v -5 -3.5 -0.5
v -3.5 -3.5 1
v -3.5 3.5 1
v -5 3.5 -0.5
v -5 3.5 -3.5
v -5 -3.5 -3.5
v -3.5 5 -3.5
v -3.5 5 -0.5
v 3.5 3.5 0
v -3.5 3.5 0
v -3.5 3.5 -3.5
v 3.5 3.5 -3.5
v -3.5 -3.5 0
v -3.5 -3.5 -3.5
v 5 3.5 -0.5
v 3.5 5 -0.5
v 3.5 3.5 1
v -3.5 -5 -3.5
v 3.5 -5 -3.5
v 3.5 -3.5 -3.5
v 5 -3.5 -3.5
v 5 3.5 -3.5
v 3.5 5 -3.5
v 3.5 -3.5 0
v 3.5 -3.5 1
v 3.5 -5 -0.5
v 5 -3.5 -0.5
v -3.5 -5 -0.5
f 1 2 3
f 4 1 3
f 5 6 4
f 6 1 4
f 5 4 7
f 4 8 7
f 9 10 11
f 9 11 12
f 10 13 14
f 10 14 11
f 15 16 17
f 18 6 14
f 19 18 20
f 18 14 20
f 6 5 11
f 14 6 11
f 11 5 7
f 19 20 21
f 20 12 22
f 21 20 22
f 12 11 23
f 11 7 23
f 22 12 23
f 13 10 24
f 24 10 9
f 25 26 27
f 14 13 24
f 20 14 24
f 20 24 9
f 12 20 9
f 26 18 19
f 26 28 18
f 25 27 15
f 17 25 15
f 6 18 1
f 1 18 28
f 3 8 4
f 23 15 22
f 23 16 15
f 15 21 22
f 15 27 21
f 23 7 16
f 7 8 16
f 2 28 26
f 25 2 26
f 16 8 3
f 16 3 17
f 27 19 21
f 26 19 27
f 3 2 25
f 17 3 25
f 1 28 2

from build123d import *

# Parameters (mm, degrees)
F0_W     = 10
F0_H     = 10
F0_W_2   = 7
F0_H_2   = 7
F1_DEPTH = 1
F2_DEPTH = 3.5
F3_SIZE  = 1.5


with BuildPart() as f1:
    # F0 (on Top) → F1 (new body)
    with BuildSketch(Plane.XY):
        Rectangle(F0_W, F0_H)
        Rectangle(F0_W_2, F0_H_2, mode=Mode.SUBTRACT)
        Rectangle(F0_W_2, F0_H_2)
    extrude(amount=F1_DEPTH)

    # F0 (on Top) → F2 (join)
    with BuildSketch(Plane.XY):
        Rectangle(F0_W, F0_H)
        Rectangle(F0_W_2, F0_H_2, mode=Mode.SUBTRACT)
    extrude(amount=-F2_DEPTH)

    # F3
    f3_edges = [f1.edges().sort_by_distance(p)[0] for p in [
        (5, -5, -1.25),
        (-5, -5, -1.25),
        (-5, 5, -1.25),
        (5, 5, -1.25),
        (0, -5, 1),
        (0, 5, 1),
        (-5, 0, 1),
        (5, 0, 1),
    ]]
    chamfer(f3_edges, length=F3_SIZE)


solid = f1.part
